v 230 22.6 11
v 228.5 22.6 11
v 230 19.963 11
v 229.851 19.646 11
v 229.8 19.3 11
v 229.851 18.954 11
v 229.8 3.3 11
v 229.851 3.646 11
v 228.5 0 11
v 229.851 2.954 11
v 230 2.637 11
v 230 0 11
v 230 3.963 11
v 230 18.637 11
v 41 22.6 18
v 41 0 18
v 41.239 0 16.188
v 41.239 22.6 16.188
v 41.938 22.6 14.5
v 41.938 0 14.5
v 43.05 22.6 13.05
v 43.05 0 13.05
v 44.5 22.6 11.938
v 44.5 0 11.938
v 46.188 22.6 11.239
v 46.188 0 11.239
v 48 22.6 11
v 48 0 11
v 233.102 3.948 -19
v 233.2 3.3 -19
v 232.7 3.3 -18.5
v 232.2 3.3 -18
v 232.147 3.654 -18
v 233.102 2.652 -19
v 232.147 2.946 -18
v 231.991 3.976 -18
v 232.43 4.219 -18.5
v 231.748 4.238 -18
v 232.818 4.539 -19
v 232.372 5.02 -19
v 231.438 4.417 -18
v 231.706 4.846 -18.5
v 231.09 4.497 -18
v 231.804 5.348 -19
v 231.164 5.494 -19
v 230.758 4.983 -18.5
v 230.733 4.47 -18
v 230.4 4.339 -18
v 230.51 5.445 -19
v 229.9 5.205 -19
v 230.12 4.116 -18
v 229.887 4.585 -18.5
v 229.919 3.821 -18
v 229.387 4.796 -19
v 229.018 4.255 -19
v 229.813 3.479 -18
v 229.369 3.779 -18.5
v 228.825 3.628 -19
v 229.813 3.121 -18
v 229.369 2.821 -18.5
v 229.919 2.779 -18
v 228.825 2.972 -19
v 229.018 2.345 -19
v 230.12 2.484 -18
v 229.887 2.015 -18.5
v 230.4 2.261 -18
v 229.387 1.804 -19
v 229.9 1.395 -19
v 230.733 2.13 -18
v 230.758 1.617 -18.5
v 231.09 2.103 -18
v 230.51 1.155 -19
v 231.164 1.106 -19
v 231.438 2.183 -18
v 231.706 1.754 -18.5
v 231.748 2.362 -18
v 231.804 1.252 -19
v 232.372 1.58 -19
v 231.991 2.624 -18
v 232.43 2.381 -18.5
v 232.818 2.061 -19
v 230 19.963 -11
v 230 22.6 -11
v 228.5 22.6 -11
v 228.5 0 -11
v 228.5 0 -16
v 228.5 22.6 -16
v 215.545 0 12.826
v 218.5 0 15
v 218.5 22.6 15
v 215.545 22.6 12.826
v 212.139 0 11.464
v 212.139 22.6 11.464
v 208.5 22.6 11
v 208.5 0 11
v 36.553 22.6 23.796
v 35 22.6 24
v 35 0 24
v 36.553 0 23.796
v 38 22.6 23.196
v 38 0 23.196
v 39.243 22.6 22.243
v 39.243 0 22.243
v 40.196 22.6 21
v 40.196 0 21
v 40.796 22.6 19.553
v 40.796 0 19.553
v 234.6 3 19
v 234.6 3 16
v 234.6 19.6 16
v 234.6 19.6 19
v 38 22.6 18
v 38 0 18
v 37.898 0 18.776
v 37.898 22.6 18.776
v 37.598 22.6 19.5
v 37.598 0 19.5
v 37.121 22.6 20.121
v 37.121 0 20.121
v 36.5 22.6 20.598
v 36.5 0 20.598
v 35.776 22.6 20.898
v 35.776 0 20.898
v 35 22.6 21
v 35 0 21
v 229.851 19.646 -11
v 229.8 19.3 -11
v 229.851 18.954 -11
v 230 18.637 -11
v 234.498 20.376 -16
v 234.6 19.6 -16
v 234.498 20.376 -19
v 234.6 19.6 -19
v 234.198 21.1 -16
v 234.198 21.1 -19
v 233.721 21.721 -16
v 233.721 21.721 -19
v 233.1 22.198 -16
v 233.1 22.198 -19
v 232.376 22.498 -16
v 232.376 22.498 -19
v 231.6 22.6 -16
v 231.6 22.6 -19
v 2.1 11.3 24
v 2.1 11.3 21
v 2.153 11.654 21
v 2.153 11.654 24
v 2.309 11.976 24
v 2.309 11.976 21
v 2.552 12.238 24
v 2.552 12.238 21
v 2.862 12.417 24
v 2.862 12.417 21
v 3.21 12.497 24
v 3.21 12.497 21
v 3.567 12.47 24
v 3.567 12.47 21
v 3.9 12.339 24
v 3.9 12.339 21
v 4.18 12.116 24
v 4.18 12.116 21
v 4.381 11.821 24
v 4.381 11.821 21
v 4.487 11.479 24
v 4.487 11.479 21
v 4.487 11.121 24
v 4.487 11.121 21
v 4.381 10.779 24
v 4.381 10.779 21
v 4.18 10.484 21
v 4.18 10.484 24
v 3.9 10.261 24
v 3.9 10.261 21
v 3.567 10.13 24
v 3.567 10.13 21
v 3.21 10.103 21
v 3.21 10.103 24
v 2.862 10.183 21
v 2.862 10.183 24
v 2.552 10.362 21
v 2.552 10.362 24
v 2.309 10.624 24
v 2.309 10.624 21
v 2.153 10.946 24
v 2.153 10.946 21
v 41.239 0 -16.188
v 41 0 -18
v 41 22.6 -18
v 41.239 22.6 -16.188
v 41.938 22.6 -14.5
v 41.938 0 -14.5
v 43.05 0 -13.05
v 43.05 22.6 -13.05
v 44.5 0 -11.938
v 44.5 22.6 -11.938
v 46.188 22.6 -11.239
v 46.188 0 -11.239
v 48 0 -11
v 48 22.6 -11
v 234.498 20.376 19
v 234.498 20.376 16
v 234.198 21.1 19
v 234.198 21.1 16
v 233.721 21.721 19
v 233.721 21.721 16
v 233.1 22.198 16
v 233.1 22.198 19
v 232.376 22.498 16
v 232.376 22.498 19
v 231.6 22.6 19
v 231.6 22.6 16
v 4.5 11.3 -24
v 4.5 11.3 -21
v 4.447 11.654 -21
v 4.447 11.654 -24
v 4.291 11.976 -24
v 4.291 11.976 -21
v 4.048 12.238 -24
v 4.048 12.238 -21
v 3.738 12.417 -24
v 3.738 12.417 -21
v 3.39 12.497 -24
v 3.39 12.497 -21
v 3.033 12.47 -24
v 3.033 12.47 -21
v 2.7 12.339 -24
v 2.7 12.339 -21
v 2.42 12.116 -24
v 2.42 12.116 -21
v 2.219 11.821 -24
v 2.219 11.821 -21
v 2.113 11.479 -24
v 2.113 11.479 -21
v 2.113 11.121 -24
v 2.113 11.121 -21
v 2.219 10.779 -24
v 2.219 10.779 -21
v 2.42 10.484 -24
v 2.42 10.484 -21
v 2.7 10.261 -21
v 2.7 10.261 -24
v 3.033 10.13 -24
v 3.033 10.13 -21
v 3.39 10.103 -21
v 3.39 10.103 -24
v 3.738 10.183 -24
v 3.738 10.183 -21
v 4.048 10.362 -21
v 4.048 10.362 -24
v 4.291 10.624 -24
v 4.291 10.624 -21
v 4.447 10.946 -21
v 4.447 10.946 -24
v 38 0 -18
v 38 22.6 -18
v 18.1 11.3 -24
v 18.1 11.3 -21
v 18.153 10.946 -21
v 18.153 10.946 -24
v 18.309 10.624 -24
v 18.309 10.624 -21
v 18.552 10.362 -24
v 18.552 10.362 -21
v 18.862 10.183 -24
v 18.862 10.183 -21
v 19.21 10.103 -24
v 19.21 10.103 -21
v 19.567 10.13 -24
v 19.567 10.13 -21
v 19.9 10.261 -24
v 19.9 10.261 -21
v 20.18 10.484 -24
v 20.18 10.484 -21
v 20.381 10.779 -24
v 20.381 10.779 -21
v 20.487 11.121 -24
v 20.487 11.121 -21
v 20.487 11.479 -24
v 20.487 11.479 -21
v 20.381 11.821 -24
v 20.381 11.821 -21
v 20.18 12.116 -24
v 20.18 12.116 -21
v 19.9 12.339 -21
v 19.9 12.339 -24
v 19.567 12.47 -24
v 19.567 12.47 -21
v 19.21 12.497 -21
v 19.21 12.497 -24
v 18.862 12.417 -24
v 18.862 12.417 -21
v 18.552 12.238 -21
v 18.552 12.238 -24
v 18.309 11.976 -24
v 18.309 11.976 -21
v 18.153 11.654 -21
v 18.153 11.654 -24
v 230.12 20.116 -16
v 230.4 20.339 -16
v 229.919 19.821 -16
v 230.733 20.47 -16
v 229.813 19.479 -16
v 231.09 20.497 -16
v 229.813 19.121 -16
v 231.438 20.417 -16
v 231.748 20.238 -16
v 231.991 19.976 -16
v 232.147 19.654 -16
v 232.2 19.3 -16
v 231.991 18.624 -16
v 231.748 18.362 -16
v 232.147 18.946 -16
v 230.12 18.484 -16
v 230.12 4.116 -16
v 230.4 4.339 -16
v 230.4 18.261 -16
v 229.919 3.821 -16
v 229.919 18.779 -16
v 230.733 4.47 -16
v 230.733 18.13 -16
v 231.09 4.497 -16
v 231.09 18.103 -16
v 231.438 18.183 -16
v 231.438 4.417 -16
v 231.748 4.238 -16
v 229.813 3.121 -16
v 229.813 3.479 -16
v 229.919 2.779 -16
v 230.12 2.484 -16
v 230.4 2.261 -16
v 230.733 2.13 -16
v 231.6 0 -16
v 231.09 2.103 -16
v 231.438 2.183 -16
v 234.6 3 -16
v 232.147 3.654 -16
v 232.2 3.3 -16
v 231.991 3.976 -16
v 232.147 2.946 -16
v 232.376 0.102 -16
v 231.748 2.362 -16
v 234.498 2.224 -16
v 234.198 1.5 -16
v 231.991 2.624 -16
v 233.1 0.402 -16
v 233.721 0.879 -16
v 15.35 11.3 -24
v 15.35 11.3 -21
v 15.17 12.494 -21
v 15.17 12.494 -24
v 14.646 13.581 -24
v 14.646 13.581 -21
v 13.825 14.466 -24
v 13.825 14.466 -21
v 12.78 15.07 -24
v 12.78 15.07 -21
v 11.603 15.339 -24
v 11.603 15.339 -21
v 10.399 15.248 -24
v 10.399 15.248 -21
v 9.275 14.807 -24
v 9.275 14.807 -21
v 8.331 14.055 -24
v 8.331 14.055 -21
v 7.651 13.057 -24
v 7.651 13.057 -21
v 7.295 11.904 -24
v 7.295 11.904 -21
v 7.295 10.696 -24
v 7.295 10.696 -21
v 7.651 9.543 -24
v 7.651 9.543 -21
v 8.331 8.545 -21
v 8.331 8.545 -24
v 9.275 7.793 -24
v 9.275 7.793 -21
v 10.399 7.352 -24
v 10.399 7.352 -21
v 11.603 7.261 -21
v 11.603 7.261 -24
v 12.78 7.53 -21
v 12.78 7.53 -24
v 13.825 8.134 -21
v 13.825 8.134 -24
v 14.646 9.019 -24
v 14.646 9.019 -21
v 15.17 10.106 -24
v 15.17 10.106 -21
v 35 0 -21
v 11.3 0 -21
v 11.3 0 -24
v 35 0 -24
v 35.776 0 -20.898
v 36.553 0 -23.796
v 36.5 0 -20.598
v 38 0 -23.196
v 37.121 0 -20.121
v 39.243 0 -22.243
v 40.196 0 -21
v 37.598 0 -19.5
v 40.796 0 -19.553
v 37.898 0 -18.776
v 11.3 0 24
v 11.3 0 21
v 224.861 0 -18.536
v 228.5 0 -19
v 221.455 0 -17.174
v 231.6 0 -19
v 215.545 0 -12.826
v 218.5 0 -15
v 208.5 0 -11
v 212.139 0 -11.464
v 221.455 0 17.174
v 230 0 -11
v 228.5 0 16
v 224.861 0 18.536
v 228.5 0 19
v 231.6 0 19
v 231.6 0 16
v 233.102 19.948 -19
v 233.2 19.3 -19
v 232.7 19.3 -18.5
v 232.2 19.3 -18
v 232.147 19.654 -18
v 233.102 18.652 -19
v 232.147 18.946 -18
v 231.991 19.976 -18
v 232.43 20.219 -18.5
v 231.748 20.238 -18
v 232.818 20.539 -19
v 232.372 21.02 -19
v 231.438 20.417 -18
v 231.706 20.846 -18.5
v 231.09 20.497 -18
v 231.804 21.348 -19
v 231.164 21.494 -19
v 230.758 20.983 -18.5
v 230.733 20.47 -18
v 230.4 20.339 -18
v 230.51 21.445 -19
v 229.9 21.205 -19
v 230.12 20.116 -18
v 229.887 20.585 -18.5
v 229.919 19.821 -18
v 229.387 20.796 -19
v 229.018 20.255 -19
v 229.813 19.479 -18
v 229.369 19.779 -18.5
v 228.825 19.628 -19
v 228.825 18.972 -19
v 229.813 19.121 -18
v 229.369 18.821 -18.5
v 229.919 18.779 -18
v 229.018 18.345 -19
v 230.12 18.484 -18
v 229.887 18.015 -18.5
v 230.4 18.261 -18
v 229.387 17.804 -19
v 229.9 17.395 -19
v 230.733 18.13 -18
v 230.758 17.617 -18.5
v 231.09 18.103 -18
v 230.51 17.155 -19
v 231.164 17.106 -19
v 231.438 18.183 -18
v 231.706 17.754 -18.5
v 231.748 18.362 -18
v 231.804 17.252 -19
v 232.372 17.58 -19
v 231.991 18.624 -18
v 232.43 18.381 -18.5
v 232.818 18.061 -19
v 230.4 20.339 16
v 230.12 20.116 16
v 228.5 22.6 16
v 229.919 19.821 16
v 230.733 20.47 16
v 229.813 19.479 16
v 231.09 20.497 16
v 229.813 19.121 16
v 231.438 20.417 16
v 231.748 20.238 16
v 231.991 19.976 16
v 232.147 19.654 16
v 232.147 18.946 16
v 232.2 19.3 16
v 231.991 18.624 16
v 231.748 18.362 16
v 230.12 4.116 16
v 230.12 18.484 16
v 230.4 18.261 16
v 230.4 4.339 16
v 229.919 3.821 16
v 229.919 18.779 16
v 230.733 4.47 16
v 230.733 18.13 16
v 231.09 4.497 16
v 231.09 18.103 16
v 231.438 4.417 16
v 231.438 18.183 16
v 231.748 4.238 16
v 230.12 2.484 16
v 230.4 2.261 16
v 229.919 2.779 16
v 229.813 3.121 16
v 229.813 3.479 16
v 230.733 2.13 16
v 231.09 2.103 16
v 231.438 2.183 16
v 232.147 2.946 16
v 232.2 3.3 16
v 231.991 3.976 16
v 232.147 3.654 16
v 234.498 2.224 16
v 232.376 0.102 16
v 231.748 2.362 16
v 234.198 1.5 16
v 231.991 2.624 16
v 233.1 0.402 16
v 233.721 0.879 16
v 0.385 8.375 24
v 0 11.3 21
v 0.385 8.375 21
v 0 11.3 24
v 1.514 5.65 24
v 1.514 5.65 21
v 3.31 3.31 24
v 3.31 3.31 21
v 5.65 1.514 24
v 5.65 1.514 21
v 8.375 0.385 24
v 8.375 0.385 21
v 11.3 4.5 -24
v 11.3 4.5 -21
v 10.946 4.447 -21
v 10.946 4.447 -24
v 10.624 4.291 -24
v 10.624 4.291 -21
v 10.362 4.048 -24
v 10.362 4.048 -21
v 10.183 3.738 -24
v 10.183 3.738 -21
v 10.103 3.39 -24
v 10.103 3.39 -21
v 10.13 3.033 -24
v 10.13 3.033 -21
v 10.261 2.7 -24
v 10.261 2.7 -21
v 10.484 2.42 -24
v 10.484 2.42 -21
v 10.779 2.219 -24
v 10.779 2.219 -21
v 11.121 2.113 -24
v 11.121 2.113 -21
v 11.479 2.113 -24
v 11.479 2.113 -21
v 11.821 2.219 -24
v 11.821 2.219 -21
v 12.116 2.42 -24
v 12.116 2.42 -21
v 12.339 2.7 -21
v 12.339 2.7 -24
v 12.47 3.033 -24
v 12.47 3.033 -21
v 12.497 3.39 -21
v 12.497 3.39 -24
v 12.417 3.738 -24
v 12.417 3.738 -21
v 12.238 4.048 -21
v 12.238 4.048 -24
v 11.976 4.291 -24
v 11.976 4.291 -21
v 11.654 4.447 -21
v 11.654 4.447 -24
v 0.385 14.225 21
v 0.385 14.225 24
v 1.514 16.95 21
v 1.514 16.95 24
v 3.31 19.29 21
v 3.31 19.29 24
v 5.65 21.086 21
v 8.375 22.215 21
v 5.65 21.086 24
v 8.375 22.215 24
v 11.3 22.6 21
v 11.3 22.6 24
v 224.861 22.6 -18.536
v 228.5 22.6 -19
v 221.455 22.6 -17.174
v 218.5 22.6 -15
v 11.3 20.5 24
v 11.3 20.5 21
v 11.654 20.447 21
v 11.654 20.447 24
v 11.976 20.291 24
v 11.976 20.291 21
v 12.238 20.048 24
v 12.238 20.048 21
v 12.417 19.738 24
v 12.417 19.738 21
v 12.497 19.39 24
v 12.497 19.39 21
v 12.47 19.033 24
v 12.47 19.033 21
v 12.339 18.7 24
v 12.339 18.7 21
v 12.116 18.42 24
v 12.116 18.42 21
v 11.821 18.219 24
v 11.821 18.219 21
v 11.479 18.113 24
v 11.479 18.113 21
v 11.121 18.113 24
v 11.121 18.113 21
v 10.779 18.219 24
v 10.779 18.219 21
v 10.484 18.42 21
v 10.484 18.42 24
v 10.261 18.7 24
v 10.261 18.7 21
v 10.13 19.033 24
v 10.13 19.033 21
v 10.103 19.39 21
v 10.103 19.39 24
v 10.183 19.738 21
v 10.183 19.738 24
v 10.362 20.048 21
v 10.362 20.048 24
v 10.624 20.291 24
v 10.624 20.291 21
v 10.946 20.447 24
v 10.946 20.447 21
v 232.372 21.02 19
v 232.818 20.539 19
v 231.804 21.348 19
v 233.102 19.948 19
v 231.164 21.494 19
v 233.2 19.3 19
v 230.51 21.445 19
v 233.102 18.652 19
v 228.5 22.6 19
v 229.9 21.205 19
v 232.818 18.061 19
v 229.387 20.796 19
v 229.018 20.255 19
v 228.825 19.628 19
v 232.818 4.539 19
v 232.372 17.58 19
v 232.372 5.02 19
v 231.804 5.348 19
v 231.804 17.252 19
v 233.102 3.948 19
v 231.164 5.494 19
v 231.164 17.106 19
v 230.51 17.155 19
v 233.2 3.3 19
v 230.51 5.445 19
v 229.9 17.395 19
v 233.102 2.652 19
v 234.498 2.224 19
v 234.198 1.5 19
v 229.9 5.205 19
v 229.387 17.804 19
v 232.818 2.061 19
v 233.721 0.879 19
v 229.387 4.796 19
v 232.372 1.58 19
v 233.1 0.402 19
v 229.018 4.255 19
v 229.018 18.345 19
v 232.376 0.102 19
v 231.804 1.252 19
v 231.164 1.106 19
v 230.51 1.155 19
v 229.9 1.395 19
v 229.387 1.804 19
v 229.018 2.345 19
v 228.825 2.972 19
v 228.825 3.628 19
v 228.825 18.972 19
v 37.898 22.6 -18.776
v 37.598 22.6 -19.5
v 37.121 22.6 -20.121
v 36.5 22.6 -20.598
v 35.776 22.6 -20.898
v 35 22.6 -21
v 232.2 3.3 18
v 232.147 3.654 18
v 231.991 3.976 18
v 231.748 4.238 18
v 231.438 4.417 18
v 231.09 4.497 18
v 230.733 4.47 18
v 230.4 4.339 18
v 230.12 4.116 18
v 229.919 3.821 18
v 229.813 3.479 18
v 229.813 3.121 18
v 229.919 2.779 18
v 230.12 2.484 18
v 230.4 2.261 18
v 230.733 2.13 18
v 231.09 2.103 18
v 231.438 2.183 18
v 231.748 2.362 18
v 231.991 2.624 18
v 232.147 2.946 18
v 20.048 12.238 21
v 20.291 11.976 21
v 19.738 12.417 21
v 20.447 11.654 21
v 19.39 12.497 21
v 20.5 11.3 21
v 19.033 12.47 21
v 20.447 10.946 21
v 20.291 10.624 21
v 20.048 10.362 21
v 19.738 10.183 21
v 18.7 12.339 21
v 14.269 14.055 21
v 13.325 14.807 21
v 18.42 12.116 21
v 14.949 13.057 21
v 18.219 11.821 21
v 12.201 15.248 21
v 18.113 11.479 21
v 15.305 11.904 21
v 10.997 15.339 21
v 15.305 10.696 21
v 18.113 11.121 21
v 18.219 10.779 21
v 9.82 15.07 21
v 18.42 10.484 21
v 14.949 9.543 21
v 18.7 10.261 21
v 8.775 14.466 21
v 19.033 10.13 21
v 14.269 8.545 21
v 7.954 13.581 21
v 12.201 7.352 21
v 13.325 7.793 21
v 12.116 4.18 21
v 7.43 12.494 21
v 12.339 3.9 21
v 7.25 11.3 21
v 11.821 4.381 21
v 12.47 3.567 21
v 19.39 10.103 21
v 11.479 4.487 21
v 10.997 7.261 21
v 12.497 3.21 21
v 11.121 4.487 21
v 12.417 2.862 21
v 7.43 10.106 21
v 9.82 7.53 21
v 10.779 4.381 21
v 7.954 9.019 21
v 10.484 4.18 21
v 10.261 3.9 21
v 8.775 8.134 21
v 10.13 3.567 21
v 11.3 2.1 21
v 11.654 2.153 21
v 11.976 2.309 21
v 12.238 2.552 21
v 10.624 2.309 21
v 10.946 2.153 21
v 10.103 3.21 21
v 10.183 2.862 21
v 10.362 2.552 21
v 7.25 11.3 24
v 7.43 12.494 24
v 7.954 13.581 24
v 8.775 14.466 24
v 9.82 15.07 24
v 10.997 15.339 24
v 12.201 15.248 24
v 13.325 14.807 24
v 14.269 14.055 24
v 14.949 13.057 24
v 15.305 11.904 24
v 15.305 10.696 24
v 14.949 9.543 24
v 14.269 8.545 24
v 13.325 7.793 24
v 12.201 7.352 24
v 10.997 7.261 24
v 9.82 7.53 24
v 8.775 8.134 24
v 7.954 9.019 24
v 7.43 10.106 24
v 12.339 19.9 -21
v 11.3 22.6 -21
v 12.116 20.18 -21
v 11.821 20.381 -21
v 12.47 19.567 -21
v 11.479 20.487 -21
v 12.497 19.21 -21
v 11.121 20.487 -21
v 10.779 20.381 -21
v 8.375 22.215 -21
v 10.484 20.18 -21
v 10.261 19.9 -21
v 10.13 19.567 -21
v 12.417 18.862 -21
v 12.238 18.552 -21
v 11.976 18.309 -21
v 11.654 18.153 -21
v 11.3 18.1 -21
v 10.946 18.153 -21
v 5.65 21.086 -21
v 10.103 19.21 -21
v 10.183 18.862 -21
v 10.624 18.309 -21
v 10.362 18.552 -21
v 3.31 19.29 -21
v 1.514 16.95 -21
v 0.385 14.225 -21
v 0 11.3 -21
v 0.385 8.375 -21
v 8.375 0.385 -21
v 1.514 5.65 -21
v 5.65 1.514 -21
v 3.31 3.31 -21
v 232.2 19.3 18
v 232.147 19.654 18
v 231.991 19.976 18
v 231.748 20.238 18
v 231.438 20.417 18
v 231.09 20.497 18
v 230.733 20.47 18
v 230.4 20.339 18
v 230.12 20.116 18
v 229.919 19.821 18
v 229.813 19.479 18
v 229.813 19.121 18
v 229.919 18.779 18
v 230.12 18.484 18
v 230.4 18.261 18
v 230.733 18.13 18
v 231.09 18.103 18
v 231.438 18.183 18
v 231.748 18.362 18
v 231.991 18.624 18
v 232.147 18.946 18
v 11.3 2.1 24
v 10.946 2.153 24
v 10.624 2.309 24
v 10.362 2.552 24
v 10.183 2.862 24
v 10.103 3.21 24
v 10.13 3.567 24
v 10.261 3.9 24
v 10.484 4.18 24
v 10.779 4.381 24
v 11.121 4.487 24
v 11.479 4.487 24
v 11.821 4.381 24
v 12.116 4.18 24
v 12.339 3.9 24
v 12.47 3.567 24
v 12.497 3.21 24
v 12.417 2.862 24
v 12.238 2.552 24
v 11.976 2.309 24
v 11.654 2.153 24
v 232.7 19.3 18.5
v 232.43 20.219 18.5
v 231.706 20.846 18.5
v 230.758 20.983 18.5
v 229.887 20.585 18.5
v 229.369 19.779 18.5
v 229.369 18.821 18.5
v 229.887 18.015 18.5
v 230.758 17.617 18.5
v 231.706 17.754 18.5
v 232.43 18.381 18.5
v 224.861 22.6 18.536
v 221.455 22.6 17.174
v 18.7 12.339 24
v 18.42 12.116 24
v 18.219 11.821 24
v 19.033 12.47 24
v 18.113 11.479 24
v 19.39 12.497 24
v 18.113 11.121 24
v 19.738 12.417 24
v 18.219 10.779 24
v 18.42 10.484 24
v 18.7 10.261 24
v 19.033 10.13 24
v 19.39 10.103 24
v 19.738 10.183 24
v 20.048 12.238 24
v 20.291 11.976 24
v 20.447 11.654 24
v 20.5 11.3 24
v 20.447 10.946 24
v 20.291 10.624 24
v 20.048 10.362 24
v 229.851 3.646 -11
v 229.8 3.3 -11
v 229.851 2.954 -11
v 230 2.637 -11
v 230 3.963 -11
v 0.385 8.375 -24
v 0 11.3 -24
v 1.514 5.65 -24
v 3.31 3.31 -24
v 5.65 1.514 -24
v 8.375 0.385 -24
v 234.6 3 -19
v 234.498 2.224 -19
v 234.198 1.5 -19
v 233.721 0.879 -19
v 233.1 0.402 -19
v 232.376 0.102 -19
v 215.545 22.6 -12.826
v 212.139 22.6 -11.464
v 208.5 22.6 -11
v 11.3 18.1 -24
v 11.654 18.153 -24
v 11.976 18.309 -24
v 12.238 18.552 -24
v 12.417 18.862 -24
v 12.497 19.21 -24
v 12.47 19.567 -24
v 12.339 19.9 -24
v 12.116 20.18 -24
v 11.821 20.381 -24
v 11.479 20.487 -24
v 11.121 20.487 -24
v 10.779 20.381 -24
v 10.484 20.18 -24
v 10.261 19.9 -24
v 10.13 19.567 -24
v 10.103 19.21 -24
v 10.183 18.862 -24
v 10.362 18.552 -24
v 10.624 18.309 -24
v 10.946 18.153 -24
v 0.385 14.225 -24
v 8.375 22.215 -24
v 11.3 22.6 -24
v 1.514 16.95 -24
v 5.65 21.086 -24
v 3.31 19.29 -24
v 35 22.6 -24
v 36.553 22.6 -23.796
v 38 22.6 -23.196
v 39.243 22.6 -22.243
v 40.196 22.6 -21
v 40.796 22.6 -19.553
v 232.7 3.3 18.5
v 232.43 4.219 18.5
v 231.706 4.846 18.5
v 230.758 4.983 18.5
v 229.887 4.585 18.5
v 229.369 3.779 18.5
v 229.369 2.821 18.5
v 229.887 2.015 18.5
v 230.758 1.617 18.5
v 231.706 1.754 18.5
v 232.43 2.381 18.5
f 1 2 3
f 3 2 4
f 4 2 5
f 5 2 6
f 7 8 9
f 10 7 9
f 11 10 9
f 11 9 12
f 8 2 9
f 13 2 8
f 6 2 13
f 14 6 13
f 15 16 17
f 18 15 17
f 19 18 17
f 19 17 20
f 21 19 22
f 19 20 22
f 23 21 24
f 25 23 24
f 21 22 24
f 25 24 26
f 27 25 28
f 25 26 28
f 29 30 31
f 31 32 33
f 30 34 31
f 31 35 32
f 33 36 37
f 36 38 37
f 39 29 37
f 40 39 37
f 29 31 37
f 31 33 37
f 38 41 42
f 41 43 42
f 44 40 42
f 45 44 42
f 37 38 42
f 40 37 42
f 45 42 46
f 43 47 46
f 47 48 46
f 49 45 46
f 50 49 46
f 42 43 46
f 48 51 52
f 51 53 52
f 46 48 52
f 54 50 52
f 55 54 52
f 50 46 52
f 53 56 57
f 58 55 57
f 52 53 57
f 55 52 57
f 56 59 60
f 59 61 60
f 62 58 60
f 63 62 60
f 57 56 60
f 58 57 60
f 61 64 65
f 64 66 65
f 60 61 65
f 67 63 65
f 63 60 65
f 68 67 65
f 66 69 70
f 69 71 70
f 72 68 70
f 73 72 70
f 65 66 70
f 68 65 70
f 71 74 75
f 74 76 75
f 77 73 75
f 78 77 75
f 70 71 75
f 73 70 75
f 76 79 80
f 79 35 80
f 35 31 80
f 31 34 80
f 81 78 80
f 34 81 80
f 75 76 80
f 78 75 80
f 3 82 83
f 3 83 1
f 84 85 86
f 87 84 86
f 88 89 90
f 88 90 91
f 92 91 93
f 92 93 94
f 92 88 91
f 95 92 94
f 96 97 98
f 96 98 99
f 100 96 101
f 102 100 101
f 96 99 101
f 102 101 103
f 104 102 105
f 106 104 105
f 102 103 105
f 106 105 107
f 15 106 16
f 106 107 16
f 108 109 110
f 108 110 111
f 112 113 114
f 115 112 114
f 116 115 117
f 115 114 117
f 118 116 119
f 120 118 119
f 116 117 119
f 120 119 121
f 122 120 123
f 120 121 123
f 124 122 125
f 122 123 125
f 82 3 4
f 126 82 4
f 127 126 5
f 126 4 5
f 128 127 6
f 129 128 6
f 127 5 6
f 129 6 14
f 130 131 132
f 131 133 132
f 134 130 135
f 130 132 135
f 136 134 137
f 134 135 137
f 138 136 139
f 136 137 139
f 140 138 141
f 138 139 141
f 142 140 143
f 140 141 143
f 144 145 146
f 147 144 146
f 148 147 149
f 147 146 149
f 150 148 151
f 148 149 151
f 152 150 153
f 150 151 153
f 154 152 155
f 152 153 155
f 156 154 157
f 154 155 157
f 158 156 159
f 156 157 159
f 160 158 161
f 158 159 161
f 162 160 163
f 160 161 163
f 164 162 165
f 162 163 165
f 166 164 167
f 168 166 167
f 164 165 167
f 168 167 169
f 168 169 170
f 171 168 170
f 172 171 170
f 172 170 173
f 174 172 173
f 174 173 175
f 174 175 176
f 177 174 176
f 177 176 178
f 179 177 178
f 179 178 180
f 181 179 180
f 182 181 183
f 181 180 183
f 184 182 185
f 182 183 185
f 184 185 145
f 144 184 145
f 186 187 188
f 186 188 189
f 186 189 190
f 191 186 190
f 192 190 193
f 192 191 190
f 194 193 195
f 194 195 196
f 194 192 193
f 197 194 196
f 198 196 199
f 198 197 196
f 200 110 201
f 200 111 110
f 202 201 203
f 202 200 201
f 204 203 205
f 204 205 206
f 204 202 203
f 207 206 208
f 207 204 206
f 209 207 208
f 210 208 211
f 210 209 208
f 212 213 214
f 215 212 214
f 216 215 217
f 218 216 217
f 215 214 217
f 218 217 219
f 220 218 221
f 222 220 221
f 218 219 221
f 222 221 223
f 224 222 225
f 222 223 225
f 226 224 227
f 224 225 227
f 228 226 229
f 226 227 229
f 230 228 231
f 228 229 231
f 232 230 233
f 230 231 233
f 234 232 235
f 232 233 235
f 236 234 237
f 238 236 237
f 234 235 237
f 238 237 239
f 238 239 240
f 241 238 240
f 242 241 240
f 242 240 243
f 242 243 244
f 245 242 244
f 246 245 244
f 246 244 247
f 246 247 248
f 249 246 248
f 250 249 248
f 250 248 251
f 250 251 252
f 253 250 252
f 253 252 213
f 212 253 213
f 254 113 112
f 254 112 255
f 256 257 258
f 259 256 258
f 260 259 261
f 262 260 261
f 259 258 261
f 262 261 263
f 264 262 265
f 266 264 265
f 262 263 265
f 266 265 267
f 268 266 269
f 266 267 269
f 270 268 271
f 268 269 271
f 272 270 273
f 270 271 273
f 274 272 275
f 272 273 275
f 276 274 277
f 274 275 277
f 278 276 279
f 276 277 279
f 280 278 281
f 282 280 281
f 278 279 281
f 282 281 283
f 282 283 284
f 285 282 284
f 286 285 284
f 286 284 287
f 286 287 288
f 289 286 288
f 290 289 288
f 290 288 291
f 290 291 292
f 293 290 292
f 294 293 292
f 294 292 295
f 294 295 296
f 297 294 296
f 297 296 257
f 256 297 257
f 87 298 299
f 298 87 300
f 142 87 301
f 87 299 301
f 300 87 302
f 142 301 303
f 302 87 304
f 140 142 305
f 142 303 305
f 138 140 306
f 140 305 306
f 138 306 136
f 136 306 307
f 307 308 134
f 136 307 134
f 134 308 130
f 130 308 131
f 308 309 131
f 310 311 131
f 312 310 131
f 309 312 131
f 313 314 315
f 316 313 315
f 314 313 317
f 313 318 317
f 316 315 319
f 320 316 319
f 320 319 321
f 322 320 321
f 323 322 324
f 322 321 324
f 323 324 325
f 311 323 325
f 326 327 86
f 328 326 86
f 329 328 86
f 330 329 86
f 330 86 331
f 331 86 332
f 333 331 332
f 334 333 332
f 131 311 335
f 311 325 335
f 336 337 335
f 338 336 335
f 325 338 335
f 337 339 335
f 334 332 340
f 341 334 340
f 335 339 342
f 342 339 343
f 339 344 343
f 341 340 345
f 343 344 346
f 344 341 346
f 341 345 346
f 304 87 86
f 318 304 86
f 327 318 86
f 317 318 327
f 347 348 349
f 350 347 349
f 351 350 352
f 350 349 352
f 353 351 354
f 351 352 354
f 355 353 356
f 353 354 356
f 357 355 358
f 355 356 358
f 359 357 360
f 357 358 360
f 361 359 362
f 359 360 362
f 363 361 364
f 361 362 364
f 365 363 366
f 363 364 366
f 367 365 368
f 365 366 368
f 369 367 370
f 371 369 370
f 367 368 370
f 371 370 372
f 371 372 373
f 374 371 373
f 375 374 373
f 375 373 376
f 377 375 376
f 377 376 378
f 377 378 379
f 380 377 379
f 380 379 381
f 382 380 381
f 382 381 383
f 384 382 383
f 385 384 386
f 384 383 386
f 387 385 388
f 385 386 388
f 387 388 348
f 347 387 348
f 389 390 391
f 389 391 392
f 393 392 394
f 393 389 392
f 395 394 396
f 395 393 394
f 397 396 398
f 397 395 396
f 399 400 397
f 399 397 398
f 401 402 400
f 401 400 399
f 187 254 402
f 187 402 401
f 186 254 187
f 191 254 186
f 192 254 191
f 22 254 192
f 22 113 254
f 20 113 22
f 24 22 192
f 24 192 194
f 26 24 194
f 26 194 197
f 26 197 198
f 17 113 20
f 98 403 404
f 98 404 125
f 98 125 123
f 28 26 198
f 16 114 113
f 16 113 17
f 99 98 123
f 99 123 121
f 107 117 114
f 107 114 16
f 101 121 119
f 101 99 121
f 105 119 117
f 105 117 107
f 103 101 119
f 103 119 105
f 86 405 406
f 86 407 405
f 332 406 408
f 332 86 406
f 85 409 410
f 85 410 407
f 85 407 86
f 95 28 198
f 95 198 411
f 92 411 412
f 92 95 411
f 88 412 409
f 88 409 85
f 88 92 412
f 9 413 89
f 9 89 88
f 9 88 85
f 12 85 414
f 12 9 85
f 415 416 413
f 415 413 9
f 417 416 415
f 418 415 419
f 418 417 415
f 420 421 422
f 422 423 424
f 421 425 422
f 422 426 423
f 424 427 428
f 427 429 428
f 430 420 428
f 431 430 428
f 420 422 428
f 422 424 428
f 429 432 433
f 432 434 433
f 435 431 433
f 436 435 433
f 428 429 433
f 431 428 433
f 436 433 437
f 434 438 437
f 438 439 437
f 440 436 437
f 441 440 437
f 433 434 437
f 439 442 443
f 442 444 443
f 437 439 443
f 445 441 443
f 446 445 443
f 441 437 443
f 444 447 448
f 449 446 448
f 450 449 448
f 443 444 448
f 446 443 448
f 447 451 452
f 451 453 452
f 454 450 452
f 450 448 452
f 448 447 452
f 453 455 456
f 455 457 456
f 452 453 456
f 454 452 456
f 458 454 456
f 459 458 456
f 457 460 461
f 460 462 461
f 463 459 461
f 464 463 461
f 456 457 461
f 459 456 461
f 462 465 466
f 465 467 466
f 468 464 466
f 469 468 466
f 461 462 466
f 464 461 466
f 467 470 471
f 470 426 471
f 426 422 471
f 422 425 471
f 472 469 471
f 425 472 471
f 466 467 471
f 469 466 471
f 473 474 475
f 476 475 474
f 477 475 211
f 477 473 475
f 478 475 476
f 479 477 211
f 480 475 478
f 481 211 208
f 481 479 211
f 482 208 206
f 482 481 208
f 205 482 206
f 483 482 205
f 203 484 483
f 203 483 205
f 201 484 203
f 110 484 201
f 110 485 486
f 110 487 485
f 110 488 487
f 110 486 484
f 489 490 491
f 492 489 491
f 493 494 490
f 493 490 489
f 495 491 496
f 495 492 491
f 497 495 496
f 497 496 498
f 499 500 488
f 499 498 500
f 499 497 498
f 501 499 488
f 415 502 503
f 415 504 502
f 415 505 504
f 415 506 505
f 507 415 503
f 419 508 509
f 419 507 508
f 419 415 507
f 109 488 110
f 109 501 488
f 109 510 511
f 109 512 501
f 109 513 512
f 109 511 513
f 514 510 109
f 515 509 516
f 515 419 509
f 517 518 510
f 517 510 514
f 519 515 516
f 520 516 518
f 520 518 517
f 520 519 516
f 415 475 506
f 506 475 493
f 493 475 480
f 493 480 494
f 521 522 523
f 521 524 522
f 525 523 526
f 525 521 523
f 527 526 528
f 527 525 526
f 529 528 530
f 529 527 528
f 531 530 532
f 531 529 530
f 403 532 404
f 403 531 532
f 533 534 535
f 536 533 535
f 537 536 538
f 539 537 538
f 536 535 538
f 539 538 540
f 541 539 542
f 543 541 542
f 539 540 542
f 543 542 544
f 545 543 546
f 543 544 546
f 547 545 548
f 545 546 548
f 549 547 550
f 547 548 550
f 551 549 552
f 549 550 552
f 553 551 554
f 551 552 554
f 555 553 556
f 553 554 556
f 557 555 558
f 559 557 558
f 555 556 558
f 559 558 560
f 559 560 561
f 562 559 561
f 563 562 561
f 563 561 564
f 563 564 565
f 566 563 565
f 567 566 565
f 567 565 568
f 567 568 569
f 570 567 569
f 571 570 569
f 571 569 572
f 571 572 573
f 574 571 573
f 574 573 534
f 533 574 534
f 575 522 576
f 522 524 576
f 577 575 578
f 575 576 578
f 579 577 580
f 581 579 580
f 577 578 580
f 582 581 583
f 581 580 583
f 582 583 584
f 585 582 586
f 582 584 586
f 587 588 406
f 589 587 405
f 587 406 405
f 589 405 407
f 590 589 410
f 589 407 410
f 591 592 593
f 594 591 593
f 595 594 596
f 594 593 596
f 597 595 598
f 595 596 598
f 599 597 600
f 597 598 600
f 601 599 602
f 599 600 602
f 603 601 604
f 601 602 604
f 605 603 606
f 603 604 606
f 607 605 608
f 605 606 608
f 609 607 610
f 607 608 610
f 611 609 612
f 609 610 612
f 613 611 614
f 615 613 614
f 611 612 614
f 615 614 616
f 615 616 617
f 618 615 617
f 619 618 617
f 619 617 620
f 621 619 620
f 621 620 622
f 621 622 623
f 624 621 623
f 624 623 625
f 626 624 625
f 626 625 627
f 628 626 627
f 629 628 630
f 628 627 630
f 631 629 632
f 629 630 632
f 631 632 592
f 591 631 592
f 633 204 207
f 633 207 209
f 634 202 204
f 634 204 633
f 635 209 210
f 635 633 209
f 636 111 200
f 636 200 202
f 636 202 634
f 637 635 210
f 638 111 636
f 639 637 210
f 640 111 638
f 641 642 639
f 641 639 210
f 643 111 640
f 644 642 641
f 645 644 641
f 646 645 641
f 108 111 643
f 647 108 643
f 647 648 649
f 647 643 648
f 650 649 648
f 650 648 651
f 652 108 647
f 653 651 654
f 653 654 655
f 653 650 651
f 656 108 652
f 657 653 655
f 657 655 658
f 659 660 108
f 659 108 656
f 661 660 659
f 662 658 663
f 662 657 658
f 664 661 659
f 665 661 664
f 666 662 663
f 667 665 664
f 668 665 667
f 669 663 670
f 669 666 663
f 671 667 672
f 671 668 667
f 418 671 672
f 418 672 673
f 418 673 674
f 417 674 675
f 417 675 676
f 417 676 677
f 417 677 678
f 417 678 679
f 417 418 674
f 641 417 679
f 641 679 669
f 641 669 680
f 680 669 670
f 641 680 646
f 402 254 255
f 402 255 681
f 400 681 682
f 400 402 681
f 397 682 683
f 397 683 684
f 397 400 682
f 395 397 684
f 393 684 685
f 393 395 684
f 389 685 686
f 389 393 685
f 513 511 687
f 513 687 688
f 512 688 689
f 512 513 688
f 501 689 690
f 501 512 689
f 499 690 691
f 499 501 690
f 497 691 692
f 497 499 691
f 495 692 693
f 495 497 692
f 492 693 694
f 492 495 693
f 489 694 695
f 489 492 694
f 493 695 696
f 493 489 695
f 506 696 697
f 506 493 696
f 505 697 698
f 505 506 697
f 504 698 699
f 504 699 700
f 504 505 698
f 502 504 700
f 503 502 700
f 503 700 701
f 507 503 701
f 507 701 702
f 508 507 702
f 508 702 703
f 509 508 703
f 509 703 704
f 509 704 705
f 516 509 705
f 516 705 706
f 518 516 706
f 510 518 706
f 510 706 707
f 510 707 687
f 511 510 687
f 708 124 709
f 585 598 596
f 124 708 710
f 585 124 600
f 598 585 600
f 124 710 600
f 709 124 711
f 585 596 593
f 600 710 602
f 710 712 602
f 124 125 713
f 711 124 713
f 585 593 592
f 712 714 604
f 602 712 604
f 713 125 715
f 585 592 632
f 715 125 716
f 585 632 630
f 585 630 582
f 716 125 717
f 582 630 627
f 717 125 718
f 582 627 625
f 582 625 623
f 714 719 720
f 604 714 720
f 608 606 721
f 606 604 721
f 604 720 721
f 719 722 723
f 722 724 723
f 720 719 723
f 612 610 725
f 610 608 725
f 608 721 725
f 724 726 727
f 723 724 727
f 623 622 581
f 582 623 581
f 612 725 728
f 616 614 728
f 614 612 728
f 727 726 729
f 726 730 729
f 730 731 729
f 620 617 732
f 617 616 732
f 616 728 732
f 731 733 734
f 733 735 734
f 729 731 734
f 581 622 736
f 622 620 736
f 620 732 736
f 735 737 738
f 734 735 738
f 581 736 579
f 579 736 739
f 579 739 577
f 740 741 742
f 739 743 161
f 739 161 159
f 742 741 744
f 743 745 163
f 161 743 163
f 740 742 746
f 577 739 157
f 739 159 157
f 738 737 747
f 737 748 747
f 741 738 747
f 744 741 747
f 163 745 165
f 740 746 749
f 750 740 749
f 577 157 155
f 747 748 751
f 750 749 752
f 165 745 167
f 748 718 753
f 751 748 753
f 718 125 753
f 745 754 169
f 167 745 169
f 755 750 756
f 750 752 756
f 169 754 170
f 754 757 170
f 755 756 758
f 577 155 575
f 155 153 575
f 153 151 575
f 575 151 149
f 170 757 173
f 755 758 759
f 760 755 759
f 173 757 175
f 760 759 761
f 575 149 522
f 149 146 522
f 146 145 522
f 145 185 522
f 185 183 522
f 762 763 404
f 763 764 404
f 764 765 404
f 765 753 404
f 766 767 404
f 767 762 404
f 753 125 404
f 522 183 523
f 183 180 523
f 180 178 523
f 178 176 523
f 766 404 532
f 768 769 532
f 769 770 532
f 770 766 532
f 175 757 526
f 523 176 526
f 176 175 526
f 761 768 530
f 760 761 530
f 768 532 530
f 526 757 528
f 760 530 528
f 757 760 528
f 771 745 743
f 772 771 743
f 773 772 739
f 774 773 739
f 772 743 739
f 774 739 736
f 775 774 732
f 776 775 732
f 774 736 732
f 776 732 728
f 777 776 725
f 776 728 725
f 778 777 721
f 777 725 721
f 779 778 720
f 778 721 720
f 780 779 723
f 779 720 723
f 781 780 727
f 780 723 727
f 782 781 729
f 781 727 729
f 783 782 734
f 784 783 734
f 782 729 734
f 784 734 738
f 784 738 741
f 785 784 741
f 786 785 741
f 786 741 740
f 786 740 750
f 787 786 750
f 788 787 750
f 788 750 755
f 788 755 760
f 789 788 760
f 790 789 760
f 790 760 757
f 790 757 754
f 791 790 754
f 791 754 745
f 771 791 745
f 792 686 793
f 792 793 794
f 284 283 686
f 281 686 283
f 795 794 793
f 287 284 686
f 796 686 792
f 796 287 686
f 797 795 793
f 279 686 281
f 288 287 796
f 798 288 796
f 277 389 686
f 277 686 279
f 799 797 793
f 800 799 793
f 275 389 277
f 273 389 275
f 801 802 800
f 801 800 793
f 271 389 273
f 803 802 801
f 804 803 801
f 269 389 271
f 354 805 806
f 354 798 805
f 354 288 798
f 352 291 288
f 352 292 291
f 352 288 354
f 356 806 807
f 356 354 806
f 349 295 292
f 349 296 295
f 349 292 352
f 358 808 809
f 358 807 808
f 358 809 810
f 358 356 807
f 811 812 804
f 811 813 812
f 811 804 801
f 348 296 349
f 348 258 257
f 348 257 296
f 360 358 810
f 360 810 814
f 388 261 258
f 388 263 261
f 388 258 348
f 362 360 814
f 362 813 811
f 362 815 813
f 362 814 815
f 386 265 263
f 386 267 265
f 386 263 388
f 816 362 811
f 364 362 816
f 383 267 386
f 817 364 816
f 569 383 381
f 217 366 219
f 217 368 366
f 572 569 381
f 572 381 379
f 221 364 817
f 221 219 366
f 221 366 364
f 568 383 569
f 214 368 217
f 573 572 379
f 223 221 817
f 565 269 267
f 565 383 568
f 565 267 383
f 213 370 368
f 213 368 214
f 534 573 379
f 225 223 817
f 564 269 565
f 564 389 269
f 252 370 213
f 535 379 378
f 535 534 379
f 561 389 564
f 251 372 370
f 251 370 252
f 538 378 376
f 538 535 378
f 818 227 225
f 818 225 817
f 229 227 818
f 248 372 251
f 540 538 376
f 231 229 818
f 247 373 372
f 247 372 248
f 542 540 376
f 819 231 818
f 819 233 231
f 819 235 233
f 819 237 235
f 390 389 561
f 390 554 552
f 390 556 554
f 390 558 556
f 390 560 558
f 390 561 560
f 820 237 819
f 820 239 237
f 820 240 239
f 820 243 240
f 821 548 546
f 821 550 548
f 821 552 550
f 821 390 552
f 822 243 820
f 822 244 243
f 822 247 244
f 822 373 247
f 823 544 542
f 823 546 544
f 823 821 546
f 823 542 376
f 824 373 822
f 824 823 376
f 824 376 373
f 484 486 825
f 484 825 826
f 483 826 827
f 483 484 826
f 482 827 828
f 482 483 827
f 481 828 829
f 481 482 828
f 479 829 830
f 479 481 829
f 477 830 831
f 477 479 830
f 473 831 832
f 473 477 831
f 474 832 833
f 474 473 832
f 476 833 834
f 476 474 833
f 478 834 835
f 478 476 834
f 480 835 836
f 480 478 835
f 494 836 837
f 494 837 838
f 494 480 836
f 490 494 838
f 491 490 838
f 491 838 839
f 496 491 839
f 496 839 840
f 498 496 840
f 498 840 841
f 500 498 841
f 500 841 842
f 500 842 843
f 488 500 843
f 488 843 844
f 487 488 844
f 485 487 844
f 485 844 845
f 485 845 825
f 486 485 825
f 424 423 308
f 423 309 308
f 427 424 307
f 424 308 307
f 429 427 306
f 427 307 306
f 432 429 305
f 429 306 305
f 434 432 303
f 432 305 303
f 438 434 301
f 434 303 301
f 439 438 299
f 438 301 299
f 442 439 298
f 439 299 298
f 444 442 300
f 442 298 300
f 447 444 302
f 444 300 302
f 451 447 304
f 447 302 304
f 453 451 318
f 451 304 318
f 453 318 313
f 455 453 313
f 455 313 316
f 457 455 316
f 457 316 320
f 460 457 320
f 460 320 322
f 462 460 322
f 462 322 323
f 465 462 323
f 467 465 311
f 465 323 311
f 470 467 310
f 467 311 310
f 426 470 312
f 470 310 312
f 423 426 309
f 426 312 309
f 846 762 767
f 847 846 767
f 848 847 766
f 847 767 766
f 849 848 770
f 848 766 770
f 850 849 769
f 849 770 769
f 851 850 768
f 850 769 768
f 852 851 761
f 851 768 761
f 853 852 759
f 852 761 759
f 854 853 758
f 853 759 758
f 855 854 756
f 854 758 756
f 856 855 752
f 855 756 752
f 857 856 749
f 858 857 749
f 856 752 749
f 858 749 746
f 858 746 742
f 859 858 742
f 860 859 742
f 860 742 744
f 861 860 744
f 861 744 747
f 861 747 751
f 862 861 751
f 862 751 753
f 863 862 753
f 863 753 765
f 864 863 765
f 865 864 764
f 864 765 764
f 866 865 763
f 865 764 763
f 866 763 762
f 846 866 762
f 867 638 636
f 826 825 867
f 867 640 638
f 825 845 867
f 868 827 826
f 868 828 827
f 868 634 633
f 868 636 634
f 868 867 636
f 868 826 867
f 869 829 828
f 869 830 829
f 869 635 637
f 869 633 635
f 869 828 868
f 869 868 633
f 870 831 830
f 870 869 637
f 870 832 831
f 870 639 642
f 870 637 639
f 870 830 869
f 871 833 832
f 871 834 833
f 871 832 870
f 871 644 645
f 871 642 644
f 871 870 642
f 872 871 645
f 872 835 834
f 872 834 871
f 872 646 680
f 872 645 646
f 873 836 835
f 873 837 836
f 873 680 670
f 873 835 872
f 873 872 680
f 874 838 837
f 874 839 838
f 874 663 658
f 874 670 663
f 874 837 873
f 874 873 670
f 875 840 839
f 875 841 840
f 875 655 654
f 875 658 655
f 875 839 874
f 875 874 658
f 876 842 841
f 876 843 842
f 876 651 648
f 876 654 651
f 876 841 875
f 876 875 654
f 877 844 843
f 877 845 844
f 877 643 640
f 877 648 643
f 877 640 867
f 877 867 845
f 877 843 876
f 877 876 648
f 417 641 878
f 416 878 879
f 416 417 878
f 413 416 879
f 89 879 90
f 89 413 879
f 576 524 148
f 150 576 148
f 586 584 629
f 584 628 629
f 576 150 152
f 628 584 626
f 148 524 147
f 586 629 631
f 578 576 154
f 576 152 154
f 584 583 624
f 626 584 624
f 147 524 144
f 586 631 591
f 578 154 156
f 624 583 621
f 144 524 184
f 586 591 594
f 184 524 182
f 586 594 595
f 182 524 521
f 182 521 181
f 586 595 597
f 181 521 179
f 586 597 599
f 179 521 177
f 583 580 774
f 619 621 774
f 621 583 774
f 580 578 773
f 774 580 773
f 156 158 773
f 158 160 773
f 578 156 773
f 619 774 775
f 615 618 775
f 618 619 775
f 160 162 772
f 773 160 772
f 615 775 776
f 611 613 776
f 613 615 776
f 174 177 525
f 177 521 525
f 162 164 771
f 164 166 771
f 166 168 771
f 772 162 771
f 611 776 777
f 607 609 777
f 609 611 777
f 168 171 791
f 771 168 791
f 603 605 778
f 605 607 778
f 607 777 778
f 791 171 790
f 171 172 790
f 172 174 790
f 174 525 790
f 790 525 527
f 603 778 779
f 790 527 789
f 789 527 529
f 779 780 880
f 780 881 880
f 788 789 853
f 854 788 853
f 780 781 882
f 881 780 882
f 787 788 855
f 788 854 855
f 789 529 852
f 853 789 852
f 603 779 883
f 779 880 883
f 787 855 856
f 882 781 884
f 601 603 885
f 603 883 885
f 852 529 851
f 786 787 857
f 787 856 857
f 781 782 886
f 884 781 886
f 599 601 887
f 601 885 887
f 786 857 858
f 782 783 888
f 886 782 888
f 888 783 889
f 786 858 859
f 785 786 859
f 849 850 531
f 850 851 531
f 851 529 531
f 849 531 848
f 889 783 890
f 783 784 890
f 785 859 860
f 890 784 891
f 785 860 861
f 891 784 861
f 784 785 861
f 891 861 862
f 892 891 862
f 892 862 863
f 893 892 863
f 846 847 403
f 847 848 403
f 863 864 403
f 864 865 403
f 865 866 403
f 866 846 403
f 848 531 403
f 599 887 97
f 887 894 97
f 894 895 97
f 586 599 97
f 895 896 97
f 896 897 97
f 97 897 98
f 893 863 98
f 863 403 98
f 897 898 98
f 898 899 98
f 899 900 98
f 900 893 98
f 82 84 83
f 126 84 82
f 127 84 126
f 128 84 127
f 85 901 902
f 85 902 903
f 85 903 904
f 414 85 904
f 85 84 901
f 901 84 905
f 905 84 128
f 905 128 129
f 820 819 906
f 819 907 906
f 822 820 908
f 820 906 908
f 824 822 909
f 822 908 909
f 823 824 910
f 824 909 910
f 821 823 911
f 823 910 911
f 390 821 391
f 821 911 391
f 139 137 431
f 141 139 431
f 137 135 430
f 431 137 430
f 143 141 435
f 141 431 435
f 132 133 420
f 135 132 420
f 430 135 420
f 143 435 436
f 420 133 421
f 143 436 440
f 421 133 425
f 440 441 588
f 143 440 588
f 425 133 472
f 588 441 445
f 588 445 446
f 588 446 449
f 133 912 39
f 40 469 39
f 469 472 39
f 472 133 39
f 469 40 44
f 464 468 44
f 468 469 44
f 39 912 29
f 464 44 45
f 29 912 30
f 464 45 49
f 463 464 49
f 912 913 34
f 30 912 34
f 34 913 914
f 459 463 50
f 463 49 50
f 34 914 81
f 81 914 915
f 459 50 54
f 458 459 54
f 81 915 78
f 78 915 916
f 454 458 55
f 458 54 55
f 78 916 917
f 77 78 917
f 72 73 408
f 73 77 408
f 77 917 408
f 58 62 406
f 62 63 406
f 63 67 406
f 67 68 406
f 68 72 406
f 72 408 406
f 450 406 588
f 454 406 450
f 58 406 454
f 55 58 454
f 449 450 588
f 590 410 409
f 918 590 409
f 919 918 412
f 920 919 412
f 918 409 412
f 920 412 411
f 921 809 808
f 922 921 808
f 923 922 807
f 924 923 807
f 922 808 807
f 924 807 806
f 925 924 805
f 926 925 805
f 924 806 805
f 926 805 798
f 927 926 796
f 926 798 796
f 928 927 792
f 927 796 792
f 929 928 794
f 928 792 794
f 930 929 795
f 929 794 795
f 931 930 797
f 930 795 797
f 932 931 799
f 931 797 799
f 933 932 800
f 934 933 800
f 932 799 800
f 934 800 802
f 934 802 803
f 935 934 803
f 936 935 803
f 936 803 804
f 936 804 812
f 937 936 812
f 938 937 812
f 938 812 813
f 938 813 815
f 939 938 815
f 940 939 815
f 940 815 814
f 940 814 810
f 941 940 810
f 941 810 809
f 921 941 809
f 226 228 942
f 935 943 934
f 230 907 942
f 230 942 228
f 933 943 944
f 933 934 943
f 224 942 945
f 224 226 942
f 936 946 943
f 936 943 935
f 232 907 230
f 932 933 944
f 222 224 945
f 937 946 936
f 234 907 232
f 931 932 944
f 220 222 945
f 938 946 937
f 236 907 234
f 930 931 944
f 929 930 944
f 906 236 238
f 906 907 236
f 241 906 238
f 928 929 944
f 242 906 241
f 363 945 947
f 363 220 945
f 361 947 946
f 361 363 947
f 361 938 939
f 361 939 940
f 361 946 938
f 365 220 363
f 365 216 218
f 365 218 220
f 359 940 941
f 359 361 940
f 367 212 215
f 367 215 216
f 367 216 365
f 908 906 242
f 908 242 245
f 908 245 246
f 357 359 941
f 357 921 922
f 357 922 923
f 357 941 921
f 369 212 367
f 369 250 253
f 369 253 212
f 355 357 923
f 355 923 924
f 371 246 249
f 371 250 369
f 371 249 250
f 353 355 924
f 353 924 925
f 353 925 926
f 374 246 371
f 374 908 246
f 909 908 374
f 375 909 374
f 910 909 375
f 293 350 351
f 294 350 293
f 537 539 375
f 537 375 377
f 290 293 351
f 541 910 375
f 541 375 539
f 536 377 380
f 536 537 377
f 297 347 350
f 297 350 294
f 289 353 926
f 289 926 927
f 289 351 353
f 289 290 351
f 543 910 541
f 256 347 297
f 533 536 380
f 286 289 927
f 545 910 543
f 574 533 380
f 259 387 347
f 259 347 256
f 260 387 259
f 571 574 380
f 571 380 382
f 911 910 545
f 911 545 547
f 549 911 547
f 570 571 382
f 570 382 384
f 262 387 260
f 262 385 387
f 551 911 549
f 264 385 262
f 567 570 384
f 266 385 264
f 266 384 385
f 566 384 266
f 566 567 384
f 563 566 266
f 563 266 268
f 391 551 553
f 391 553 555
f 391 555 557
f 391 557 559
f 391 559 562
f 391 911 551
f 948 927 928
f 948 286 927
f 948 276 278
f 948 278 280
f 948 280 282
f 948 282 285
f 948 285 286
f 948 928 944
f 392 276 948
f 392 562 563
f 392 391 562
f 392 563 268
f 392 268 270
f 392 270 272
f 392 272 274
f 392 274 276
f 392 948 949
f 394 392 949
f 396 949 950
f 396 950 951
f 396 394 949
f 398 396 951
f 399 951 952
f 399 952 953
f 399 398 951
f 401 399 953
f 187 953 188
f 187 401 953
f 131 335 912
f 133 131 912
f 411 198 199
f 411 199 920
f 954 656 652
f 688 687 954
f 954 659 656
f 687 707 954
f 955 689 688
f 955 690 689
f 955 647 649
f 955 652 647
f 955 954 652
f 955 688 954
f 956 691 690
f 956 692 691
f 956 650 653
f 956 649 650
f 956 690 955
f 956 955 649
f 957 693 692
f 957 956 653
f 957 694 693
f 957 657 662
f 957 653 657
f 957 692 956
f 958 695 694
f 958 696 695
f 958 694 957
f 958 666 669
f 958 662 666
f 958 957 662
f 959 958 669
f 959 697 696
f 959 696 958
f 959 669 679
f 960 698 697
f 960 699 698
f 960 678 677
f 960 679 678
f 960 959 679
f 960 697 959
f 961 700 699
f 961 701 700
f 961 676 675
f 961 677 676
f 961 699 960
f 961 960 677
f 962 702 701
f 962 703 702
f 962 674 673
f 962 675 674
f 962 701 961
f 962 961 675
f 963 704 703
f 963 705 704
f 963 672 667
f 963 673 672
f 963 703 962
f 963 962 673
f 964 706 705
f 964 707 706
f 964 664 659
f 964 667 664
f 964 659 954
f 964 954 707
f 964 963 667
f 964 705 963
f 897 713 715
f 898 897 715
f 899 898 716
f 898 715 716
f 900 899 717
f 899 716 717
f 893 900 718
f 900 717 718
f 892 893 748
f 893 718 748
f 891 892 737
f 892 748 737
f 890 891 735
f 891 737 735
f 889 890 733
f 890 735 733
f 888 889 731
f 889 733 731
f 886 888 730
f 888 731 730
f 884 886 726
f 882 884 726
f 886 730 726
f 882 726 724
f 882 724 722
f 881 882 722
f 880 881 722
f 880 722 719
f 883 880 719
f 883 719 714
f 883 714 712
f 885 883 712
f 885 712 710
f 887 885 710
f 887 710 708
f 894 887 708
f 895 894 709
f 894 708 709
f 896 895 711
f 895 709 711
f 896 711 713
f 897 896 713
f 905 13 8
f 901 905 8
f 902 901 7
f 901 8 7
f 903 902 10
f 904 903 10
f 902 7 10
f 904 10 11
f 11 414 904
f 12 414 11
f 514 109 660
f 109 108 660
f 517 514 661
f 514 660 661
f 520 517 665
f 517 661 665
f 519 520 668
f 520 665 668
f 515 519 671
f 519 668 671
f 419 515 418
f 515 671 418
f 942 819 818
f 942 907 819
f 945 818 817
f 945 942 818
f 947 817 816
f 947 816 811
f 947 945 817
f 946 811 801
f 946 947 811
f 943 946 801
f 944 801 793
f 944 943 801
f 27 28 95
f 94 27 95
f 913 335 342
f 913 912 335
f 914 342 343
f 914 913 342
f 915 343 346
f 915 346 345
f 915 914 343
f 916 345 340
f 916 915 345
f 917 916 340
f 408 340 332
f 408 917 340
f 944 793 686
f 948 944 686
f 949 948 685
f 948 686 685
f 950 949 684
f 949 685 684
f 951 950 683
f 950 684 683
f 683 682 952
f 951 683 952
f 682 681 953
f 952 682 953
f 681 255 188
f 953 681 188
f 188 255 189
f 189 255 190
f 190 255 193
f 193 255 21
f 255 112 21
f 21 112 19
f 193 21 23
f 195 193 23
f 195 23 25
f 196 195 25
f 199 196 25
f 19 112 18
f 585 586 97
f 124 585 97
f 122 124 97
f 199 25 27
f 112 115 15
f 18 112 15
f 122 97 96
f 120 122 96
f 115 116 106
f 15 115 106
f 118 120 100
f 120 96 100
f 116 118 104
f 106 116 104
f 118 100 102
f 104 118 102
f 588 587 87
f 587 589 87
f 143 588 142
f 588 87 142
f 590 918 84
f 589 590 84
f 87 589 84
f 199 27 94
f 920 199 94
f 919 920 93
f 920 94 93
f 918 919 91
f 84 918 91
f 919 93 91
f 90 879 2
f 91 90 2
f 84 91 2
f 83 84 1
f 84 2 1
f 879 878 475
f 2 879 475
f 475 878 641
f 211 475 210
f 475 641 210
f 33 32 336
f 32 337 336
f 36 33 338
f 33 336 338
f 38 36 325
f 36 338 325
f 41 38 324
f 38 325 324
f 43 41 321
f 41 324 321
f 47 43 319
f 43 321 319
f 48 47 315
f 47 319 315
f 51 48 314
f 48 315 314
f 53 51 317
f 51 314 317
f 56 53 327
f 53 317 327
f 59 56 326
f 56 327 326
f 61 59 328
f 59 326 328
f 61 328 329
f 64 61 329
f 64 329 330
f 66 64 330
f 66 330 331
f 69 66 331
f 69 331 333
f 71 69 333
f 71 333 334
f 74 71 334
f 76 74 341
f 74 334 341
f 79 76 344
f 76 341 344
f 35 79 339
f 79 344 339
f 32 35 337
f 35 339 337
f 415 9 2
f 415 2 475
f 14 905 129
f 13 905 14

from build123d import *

# Parameters (mm, degrees)
BOSS_EXTRUDE3_DEPTH                                 = 22.6
FILLET2_R                                           = 11.3
BOSS_EXTRUDE4_DEPTH                                 = 22.6
CSK_FOR_M2_COUNTERSUNK_FLAT_HEAD_SCREW1_D           = 2.4
CSK_FOR_M2_COUNTERSUNK_FLAT_HEAD_SCREW1_CSINK_D     = 4.4
CSK_FOR_M2_COUNTERSUNK_FLAT_HEAD_SCREW1_CSINK_ANGLE = 90
FILLET3_R                                           = 3
FILLET3_OF_MIRROR4_R                                = 3
M2_CLEARANCE_HOLE1_D                                = 2.4
M2_CLEARANCE_HOLE1_DEPTH                            = 3
CIRPATTERN1_COUNT                                   = 4
F_8_1_8_1_DIAMETER_HOLE1_D                          = 8.1
F_8_1_8_1_DIAMETER_HOLE1_DEPTH                      = 3
F_8_1_8_1_DIAMETER_HOLE2_D                          = 8.1
M2_CLEARANCE_HOLE2_D                                = 2.4
CIRPATTERN2_COUNT                                   = 4


with BuildPart() as part:
    # Sketch4 → Boss-Extrude3 (new body)
    with BuildSketch(Plane(origin=(0, 0, 0), x_dir=(1, 0, 0), z_dir=(0, 1, 0))):
        with BuildLine():
            Line((0, -21), (0, -24))
            Line((0, -24), (35, -24))
            ThreePointArc((35, -24), (39.242640687, -22.242640687), (41, -18))
            ThreePointArc((41, -18), (43.050252532, -13.050252532), (48, -11))
            Line((48, -11), (230, -11))
            Line((230, -11), (230, 0))
            Line((230, 0), (38, 0))
            Line((38, 0), (38, -18))
            ThreePointArc((38, -18), (37.121320344, -20.121320344), (35, -21))
            Line((35, -21), (0, -21))
        make_face()
    extrude(amount=BOSS_EXTRUDE3_DEPTH)

    # Fillet2
    fillet2_edges = [part.edges().sort_by_distance(p)[0] for p in [
        (0, 0, 22.5),
        (0, 22.6, 22.5),
    ]]
    fillet(fillet2_edges, radius=FILLET2_R - 0.0001)  # a hair under: the kernel refuses the full size

    # Mirror3: part across plane


with BuildPart() as part_1:
    add(part.part)
    add(part.part.mirror(Plane.XY))

    # Sketch5 → Boss-Extrude4 (add, through all)
    with BuildSketch(Plane(origin=(0, 0, 0), x_dir=(1, 0, 0), z_dir=(0, 1, 0))):
        with BuildLine():
            Line((208.5, 11), (228.5, 11))
            Line((228.5, 11), (228.5, 16))
            Line((228.5, 16), (234.6, 16))
            Line((234.6, 16), (234.6, 19))
            Line((234.6, 19), (228.5, 19))
            ThreePointArc((228.5, 19), (223.114835193, 17.962912018), (218.5, 15))
            ThreePointArc((218.5, 15), (213.885164807, 12.037087982), (208.5, 11))
        make_face()
    boss_extrude4 = extrude(amount=BOSS_EXTRUDE4_DEPTH)

    # CSK for M2 Countersunk Flat Head Screw1 (through all)
    with Locations(Plane(origin=(231, 3.3, -19), x_dir=(-1, 0, 0), z_dir=(0, 0, -1))):
        with Locations((0, 0), (0, 16)):
            csk_for_m2_countersunk_flat_head_screw1 = CounterSinkHole(CSK_FOR_M2_COUNTERSUNK_FLAT_HEAD_SCREW1_D / 2, CSK_FOR_M2_COUNTERSUNK_FLAT_HEAD_SCREW1_CSINK_D / 2, counter_sink_angle=CSK_FOR_M2_COUNTERSUNK_FLAT_HEAD_SCREW1_CSINK_ANGLE)

    # Fillet3
    fillet3_edges = [part_1.edges().sort_by_distance(p)[0] for p in [
        (234.6, 0, -17.5),
        (234.6, 22.6, -17.5),
    ]]
    fillet(fillet3_edges, radius=FILLET3_R)

    # Mirror4: Boss-Extrude4, CSK for M2 Countersunk Flat Head Screw1 across plane
    add(boss_extrude4.mirror(Plane.XY))
    add(csk_for_m2_countersunk_flat_head_screw1.mirror(Plane.XY), mode=Mode.SUBTRACT)

    # Fillet3 of Mirror4
    fillet3_of_mirror4_edges = [part_1.edges().sort_by_distance(p)[0] for p in [
        (234.6, 0, 17.5),
        (234.6, 22.6, 17.5),
    ]]
    fillet(fillet3_of_mirror4_edges, radius=FILLET3_OF_MIRROR4_R)

    # M2 Clearance Hole1
    with Locations(Plane(origin=(3.3, 11.3, 24), x_dir=(1, 0, 0), z_dir=(0, 0, 1))):
        with Locations((0, 0)):
            m2_clearance_hole1 = Hole(M2_CLEARANCE_HOLE1_D / 2, depth=M2_CLEARANCE_HOLE1_DEPTH)

    # CirPattern1: M2 Clearance Hole1 ×4 about axis
    cirpattern1_axis = Axis((11.3, 11.3, 0), (0, 0, 1))
    for i in range(1, CIRPATTERN1_COUNT):
        add(m2_clearance_hole1.rotate(cirpattern1_axis, i * 360 / CIRPATTERN1_COUNT), mode=Mode.SUBTRACT)

    # Ø8.1 (8.1) Diameter Hole1
    with Locations(Plane(origin=(11.3, 11.3, -24), x_dir=(-1, 0, 0), z_dir=(0, 0, -1))):
        with Locations((0, 0)):
            Hole(F_8_1_8_1_DIAMETER_HOLE1_D / 2, depth=F_8_1_8_1_DIAMETER_HOLE1_DEPTH)

    # Ø8.1 (8.1) Diameter Hole2 (through all)
    with Locations(Plane(origin=(11.3, 11.3, 24), x_dir=(1, 0, 0), z_dir=(0, 0, 1))):
        with Locations((0, 0)):
            Hole(F_8_1_8_1_DIAMETER_HOLE2_D / 2)

    # M2 Clearance Hole2 (through all)
    with Locations(Plane(origin=(3.3, 11.3, -24), x_dir=(-1, 0, 0), z_dir=(0, 0, -1))):
        with Locations((0, 0)):
            m2_clearance_hole2 = Hole(M2_CLEARANCE_HOLE2_D / 2)

    # CirPattern2: M2 Clearance Hole2 ×4 about axis
    cirpattern2_axis = Axis((11.3, 11.3, 0), (0, 0, 1))
    for i in range(1, CIRPATTERN2_COUNT):
        add(m2_clearance_hole2.rotate(cirpattern2_axis, i * 360 / CIRPATTERN2_COUNT), mode=Mode.SUBTRACT)


solid = part_1.part
